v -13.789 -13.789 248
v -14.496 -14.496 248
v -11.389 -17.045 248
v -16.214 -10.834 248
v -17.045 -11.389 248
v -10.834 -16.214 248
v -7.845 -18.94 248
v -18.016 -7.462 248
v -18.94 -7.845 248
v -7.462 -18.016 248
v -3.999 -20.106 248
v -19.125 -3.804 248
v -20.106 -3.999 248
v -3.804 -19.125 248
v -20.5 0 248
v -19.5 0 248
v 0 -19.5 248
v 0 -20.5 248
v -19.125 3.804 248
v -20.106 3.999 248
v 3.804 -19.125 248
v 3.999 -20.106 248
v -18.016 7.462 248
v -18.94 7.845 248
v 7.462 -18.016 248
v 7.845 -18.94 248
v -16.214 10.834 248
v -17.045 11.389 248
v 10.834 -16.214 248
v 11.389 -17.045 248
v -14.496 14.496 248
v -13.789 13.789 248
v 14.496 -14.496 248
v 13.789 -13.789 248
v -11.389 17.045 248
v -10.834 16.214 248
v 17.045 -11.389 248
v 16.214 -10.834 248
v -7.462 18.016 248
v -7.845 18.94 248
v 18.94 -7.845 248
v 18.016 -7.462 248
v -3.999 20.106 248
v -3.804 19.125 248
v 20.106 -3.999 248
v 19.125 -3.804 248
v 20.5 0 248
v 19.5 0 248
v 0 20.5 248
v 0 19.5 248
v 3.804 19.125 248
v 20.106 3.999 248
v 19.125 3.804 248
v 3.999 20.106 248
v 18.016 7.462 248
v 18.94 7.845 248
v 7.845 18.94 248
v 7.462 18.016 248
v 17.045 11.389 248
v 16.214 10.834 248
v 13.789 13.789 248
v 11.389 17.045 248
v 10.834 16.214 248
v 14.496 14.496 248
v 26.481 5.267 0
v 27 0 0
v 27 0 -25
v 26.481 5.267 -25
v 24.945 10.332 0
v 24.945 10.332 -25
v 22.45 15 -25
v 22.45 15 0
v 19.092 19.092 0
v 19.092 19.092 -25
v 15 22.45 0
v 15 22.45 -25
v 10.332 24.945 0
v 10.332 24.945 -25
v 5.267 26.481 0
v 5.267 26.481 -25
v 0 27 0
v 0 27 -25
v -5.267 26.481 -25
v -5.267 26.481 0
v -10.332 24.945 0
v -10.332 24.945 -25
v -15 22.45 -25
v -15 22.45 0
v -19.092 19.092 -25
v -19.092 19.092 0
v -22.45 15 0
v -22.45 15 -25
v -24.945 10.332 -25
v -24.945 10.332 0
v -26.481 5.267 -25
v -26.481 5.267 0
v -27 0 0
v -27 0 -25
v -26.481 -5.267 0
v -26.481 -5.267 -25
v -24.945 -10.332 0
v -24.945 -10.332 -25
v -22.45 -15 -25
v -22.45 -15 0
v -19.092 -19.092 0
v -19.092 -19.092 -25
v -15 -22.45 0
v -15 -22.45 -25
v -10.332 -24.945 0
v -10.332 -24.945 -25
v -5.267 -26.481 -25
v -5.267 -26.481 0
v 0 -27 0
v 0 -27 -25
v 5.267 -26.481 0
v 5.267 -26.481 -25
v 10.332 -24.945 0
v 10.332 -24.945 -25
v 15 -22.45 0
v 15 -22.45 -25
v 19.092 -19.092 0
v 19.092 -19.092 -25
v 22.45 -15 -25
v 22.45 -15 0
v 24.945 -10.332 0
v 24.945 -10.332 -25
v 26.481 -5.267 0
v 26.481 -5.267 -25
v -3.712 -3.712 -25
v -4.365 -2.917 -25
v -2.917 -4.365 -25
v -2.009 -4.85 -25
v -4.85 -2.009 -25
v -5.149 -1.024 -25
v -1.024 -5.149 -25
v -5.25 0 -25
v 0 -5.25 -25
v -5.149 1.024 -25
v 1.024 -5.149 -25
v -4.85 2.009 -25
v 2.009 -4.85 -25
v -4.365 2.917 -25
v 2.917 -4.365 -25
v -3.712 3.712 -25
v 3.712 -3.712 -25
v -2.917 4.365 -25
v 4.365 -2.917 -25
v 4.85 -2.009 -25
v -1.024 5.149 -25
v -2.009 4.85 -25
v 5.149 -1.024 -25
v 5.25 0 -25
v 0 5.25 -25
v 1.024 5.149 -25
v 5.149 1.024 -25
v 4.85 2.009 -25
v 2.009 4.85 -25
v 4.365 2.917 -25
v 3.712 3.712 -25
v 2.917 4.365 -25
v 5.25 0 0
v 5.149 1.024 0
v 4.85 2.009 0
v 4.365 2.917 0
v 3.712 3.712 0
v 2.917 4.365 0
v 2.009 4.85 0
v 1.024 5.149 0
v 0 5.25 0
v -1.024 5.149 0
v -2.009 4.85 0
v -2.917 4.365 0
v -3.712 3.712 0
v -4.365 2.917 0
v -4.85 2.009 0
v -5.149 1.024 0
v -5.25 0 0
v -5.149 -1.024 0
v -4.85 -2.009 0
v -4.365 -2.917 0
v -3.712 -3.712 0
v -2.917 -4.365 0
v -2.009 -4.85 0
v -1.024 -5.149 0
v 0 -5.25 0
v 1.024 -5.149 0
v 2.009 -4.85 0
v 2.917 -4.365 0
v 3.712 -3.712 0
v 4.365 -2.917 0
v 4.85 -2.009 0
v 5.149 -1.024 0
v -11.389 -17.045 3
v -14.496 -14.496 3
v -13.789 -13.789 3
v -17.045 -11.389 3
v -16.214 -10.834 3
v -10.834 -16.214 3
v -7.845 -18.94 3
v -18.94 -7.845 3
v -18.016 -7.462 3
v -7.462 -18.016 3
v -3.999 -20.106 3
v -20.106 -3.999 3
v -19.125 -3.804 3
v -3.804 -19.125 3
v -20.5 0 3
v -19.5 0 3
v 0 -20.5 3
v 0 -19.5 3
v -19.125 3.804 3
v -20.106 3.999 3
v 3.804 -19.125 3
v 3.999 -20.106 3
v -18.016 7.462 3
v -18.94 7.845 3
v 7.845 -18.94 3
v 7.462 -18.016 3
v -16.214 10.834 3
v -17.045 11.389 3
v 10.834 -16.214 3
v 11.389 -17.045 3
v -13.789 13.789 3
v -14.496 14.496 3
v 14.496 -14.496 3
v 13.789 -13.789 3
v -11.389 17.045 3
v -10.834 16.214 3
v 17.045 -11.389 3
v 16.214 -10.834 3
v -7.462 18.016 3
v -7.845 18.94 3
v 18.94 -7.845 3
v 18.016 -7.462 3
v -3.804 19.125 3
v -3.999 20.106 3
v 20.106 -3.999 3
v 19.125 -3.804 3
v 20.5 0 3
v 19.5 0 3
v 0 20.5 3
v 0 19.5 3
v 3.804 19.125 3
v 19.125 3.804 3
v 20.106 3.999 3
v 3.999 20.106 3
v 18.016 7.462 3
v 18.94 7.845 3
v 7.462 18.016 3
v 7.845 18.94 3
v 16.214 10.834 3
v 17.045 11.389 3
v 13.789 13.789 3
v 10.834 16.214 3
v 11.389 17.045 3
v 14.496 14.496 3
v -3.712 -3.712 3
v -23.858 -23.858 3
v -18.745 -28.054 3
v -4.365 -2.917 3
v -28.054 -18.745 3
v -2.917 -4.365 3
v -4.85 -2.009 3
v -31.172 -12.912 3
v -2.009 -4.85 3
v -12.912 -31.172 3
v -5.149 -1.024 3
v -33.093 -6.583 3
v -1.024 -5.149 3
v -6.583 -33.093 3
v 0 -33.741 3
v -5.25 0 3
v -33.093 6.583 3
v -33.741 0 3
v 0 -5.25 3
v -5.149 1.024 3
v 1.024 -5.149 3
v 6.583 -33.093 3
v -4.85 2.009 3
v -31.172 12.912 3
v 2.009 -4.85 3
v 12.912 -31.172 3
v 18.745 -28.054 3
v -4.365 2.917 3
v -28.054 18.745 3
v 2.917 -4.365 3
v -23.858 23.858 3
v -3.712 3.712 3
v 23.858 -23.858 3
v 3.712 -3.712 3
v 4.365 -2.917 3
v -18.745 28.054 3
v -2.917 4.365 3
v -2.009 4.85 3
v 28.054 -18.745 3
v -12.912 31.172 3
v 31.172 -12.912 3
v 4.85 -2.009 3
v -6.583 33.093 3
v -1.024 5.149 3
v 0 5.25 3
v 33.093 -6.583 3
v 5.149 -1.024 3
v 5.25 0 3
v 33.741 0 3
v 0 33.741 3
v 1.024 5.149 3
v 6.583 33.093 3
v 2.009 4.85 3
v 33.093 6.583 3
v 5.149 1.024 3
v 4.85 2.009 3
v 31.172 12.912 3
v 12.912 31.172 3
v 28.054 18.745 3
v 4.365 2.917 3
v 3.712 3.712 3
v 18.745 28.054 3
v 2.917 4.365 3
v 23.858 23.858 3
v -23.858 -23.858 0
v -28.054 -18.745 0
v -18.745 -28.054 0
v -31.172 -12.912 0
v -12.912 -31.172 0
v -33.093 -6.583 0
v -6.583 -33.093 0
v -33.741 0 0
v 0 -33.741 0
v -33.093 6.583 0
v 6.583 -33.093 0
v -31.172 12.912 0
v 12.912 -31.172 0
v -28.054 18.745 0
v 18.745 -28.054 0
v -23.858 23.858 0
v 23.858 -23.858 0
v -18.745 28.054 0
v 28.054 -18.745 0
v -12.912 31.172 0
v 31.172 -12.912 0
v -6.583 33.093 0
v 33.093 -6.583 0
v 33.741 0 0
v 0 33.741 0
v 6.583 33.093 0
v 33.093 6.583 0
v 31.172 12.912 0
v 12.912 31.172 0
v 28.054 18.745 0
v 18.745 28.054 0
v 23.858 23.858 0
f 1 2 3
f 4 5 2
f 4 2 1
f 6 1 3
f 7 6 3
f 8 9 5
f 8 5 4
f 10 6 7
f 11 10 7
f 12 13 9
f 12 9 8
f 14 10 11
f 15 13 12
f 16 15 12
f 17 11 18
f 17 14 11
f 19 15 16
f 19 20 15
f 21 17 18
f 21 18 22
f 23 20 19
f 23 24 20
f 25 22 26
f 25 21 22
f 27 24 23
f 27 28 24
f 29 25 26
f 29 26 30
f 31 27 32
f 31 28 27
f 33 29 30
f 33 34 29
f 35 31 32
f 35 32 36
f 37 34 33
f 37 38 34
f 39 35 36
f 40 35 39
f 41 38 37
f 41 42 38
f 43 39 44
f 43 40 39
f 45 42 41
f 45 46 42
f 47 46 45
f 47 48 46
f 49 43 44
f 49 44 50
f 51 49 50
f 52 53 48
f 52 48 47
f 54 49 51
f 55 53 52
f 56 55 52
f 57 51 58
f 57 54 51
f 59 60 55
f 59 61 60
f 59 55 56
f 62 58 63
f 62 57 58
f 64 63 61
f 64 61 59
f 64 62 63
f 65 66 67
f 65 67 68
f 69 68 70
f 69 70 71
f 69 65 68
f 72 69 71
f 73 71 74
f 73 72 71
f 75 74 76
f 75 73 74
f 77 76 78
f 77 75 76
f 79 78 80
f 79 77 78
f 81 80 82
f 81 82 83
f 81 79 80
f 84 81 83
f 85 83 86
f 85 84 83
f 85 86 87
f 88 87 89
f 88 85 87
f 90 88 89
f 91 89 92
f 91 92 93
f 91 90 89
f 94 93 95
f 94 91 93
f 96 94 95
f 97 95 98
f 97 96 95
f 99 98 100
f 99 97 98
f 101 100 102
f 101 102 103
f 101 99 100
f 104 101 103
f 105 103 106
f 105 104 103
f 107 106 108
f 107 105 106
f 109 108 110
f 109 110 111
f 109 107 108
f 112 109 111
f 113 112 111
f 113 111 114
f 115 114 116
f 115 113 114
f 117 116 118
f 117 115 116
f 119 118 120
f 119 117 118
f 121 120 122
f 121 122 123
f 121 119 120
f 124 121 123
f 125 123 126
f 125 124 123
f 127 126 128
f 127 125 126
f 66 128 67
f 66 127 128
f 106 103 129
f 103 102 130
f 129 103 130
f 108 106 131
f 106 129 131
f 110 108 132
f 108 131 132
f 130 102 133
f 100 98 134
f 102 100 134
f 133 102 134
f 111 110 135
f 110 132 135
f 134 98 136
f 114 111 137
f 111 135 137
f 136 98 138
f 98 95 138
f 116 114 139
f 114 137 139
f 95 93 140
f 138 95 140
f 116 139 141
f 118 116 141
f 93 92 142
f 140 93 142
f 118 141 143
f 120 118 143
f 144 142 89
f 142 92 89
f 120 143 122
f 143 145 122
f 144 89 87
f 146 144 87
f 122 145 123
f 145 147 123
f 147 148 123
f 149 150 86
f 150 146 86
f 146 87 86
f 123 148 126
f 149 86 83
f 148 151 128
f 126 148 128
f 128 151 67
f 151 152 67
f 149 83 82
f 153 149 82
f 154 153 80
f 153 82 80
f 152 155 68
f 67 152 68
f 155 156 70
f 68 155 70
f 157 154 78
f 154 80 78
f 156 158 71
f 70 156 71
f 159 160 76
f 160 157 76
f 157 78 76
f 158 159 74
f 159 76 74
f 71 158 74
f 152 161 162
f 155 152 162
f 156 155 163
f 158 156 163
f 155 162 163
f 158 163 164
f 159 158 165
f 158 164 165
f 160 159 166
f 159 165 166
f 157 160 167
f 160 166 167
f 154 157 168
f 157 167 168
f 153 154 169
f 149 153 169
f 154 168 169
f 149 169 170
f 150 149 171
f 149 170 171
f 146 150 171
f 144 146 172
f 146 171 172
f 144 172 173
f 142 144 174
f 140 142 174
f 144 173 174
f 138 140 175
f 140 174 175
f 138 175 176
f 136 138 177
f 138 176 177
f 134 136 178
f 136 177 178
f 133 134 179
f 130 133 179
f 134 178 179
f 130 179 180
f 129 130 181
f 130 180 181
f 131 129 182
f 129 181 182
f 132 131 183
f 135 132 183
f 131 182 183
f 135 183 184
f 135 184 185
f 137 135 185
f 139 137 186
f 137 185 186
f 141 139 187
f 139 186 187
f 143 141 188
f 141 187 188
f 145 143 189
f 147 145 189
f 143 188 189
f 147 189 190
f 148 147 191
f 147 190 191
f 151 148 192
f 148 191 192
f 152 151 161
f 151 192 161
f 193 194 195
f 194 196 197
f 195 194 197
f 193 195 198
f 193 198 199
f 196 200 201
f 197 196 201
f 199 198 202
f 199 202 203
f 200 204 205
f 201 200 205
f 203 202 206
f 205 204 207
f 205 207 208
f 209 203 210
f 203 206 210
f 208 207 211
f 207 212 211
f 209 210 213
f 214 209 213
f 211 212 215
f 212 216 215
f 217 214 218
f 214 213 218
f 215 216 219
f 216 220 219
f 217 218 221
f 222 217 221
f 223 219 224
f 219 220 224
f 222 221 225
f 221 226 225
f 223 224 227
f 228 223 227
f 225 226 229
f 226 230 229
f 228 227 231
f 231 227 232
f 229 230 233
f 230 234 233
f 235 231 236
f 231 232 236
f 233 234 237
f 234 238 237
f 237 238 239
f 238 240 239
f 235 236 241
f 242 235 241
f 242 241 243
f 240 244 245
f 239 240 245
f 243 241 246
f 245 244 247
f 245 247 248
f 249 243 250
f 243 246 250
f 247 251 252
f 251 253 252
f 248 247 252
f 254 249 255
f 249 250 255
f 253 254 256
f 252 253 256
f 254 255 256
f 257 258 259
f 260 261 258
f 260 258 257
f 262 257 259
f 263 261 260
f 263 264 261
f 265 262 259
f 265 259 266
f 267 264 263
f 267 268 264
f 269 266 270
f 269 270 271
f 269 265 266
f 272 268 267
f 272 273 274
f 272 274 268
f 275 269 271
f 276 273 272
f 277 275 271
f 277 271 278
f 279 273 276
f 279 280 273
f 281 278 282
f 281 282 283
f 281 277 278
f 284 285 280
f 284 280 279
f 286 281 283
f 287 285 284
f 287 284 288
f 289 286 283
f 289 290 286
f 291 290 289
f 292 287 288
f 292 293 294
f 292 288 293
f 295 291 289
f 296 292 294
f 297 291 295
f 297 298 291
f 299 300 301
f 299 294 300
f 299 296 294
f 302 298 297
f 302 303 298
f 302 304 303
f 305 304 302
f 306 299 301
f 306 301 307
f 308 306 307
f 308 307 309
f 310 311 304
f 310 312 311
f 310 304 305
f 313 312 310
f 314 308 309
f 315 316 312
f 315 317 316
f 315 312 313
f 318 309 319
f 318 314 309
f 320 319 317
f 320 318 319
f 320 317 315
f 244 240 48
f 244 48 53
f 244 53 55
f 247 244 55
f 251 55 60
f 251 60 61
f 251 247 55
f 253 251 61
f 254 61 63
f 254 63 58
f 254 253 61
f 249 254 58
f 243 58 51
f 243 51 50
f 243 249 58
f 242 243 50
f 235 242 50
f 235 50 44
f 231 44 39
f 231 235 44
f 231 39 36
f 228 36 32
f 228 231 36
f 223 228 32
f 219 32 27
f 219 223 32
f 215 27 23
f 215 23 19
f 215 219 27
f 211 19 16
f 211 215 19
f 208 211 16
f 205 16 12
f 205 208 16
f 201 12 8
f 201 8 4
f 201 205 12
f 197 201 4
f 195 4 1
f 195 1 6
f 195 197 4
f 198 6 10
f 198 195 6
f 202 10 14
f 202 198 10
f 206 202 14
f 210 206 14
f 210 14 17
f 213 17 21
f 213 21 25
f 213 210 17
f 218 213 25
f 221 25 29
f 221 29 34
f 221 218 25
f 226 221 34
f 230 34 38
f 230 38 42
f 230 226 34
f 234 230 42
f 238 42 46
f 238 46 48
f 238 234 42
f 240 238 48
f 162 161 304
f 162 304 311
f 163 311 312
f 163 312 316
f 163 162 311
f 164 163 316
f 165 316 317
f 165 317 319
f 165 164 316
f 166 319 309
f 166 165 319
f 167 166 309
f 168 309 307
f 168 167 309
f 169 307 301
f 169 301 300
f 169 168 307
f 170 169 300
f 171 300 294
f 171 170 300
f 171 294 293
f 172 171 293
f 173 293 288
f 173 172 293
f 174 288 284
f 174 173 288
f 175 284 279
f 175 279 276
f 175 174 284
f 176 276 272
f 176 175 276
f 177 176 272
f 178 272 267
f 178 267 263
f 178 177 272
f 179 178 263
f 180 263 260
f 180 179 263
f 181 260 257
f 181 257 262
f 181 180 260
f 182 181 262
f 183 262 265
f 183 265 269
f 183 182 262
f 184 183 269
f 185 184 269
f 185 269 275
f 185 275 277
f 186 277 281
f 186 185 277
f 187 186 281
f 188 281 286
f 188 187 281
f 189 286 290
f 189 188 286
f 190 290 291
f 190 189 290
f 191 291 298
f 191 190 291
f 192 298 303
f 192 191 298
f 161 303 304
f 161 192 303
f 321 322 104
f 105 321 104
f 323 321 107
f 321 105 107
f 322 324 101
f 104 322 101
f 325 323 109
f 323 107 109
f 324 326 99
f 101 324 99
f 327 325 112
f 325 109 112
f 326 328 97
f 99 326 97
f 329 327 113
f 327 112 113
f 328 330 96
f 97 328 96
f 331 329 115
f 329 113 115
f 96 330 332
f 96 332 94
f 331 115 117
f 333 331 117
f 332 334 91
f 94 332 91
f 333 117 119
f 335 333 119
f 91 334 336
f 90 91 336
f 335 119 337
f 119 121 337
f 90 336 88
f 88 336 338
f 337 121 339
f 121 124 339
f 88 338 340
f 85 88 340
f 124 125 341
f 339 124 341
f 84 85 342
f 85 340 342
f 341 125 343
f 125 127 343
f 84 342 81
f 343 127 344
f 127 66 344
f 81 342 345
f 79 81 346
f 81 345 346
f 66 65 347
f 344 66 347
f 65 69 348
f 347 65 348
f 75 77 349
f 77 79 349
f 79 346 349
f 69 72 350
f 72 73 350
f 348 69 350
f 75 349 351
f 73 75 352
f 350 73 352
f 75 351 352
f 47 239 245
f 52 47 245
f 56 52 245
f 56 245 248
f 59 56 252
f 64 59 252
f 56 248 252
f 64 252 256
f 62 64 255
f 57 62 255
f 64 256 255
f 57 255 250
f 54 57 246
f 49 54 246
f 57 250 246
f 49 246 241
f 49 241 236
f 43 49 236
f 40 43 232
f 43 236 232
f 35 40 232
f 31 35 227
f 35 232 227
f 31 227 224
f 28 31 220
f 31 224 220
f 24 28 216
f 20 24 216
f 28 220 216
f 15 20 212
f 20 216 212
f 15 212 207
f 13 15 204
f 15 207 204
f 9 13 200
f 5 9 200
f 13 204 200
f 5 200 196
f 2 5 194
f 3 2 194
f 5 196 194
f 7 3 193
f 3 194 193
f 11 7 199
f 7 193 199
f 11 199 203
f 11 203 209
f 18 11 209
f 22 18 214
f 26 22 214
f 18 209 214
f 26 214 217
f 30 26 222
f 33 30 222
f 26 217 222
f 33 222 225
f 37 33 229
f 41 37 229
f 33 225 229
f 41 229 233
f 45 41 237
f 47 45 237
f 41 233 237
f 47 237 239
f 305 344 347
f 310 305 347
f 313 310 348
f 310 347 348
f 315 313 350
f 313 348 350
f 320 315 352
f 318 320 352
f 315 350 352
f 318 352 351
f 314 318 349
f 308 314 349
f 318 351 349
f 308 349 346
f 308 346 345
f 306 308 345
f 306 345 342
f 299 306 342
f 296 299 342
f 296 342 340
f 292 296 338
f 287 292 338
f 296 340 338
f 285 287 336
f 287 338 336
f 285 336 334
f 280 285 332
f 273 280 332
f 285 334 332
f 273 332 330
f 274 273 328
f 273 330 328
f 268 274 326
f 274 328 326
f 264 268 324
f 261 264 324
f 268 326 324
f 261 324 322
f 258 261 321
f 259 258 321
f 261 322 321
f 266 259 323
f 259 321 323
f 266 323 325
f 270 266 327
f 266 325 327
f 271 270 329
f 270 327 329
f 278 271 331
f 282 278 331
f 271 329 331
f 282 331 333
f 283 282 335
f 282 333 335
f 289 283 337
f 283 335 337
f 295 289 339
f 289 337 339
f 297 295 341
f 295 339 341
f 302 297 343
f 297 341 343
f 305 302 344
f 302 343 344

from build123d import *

# Parameters (mm, degrees)
F0_R     = 33.740848
F0_R_2   = 27
F0_R_3   = 5.25
F1_DEPTH = 3
F2_DEPTH = 25
F3_R     = 20.5
F3_R_2   = 19.5
F4_DEPTH = 245


with BuildPart() as f1:
    # F0 (on Top) → F1 (new body)
    with BuildSketch(Plane.XY):
        Circle(F0_R)
        Circle(F0_R_2, mode=Mode.SUBTRACT)
        Circle(F0_R_2)
        Circle(F0_R_3, mode=Mode.SUBTRACT)
    extrude(amount=F1_DEPTH)

    # F0 (on Top) → F2 (join)
    with BuildSketch(Plane.XY):
        Circle(F0_R_2)
        Circle(F0_R_3, mode=Mode.SUBTRACT)
    extrude(amount=-F2_DEPTH)


with BuildPart() as f4:
    # F3 (on face) → F4 (new body)
    with BuildSketch(Plane.XY.offset(3)):
        Circle(F3_R)
        Circle(F3_R_2, mode=Mode.SUBTRACT)
    extrude(amount=F4_DEPTH)


solid = Compound([f1.part, f4.part])
